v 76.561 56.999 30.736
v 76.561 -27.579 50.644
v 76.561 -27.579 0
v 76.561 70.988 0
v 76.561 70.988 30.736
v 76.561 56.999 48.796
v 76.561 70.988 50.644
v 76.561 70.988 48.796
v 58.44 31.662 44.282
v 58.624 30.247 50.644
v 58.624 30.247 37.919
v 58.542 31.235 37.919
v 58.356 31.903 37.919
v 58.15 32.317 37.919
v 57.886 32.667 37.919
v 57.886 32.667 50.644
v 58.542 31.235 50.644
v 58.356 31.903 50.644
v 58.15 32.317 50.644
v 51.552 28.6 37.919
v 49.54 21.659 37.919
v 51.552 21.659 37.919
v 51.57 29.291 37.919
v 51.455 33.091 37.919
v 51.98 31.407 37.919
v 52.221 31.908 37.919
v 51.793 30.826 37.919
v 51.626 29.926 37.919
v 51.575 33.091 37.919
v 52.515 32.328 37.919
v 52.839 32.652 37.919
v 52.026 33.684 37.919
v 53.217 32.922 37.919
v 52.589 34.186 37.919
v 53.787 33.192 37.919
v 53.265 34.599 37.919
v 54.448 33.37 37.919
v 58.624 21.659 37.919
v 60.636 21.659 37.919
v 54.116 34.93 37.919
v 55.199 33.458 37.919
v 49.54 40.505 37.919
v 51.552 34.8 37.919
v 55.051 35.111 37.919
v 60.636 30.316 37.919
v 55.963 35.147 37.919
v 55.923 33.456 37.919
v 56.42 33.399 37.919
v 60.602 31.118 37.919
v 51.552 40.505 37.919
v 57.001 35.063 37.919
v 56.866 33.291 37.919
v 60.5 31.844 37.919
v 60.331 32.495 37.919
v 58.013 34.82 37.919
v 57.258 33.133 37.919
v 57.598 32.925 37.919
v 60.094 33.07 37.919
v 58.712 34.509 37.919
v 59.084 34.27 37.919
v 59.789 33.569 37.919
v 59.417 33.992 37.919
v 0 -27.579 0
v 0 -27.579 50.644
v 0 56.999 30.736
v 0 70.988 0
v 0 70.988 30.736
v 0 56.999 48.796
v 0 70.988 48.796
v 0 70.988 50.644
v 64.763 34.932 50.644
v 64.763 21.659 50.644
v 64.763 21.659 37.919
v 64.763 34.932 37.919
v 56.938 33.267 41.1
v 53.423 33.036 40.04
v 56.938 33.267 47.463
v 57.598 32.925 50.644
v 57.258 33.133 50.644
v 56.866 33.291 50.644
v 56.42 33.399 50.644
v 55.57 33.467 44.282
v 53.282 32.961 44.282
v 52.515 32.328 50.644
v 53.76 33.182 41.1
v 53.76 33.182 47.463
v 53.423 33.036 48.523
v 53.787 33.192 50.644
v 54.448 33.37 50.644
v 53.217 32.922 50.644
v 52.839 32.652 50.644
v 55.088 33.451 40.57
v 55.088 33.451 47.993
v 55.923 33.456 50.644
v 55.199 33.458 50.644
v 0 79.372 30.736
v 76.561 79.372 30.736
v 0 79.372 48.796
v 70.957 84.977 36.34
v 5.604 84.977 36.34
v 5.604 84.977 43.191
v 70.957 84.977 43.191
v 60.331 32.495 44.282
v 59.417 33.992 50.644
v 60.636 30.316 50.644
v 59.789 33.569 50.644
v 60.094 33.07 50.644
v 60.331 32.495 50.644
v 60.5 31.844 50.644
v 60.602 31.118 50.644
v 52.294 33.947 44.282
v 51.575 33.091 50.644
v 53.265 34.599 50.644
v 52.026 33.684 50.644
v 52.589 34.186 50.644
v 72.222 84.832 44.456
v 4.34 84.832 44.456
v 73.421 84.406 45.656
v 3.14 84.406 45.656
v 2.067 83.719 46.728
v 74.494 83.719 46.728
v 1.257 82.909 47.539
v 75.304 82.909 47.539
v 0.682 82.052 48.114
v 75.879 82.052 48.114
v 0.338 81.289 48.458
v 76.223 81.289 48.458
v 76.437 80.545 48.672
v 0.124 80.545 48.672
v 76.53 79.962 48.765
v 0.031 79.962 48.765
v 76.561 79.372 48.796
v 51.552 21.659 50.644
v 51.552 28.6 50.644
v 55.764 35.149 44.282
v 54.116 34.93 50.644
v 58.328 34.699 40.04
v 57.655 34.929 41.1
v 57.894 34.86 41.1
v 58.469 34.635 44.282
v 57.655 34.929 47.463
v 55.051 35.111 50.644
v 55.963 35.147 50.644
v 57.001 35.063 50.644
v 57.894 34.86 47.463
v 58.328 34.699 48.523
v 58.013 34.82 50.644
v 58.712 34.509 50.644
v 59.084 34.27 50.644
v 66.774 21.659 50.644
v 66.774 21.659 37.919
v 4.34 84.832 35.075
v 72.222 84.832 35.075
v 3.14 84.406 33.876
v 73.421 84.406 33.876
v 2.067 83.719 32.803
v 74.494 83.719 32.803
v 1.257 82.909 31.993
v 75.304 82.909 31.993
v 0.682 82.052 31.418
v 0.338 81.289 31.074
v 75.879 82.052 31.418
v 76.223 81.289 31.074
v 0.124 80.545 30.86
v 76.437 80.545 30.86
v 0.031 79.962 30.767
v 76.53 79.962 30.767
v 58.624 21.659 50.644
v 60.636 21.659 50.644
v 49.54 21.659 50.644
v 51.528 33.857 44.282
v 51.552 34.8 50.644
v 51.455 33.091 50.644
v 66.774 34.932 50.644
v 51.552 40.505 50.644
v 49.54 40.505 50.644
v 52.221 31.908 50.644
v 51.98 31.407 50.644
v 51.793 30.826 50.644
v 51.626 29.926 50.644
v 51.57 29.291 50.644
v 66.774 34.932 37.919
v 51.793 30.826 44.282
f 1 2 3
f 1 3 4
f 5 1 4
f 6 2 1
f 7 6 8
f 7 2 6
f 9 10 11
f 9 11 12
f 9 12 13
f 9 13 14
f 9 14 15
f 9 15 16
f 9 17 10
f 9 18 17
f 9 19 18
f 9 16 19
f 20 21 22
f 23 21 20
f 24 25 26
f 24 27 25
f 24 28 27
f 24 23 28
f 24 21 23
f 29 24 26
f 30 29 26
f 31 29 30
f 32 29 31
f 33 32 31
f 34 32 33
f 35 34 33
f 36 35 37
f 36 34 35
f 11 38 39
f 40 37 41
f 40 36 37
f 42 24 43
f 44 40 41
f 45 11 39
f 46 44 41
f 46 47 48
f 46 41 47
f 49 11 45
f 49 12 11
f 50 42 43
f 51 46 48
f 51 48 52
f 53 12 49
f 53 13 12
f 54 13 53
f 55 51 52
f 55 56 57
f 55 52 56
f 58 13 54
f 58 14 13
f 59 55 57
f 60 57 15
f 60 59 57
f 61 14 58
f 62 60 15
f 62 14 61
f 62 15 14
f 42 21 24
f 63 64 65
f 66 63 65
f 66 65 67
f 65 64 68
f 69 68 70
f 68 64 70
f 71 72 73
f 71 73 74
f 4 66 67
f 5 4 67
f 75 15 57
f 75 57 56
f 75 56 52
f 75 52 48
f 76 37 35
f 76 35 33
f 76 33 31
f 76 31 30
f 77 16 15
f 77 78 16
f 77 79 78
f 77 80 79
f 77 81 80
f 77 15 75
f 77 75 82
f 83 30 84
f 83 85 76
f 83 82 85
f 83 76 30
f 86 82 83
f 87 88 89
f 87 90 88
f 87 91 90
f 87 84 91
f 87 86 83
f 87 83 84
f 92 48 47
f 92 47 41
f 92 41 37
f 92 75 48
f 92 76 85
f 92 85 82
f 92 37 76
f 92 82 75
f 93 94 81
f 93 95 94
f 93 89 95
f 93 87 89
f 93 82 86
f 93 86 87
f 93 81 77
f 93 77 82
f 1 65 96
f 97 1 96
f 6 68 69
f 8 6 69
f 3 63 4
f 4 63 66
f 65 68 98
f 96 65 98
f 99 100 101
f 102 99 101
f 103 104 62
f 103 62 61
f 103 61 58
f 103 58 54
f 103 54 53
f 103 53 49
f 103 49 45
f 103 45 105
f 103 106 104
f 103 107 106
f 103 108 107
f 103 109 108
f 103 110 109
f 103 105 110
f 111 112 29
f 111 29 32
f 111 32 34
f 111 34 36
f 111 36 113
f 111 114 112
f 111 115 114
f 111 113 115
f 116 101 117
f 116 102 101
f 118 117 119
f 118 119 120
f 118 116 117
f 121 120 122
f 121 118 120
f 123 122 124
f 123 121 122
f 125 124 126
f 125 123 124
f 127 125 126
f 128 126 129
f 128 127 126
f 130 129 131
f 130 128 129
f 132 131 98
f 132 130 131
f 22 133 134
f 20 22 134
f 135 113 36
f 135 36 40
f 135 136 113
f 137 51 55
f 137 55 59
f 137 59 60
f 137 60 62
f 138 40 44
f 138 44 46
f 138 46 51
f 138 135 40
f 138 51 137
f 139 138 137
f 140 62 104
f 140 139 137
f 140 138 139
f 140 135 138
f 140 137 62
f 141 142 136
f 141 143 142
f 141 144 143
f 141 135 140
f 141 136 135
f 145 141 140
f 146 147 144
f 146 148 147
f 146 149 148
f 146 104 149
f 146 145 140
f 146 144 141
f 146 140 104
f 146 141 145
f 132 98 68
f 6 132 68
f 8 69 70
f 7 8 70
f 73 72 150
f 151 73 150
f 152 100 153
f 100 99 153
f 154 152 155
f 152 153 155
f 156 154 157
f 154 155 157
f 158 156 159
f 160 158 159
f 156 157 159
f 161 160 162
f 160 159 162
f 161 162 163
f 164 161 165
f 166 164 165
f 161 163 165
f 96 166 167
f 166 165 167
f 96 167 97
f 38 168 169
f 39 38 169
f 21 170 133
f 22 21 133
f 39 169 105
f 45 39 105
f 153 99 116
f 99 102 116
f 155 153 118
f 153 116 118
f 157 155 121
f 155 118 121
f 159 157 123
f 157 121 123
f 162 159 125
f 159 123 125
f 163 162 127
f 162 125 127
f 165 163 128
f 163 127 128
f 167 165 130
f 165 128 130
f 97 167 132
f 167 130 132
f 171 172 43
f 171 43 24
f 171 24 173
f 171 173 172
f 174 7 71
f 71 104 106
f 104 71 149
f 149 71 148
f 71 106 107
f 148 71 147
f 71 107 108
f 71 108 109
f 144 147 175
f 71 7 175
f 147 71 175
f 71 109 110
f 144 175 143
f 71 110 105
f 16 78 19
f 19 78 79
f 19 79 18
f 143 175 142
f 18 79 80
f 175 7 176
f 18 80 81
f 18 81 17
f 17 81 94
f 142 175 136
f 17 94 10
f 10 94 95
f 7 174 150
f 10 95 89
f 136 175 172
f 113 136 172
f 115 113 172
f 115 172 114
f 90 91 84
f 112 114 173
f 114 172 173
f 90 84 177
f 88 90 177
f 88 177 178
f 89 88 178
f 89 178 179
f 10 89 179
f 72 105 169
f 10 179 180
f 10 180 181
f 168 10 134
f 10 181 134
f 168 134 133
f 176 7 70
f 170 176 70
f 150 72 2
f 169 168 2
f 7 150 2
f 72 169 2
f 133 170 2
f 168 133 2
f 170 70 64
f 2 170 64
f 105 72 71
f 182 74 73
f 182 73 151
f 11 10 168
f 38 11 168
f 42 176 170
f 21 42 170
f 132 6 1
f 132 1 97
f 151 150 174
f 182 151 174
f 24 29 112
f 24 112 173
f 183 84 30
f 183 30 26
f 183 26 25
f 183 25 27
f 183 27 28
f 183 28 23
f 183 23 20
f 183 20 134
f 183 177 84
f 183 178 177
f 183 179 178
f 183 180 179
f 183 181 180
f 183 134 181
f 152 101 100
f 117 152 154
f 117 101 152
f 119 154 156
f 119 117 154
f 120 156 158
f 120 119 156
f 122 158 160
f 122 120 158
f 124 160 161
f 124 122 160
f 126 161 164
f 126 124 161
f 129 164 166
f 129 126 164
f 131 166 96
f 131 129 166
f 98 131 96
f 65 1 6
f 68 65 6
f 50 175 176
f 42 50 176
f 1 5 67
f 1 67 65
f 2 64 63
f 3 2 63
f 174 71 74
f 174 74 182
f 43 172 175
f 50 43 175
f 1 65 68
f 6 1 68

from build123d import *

# Parameters (mm, degrees)
F2_DEPTH = 76.5611305833
F0_W     = 13.9886513352
F0_H     = 18.059886992
F3_R     = 5.6044980923
F4_W     = 2.0113031108
F4_H     = 13.2730503942
F5_DEPTH = 12.7252740785


with BuildPart() as f2:
    # F1 (on face) → F2 (new body)
    with BuildSketch(Plane.YZ):
        Polygon((-27.5792516768, 50.6441742182), (-27.5792516768, 0), (70.9878802299, 0), (70.9878802299, 30.7358391583), (56.9992288947, 30.7358391583), (56.9992288947, 48.7957261503), (70.9878802299, 48.7957261503), (70.9878802299, 50.6441742182), align=None)
    extrude(amount=F2_DEPTH)

    # F4 (on face) → F5 (cut)
    with BuildSketch(Plane.XY.offset(50.6441742182)):
        with BuildLine():
            Line((58.6242635295, 30.2465461298), (58.6242635295, 21.6587856412))
            Line((58.6242635295, 21.6587856412), (60.6355666403, 21.6587856412))
            Line((60.6355666403, 21.6587856412), (60.6355666403, 30.3163023071))
            add(Edge.make_bspline(
                [(59.4167712099, 33.992065314), (60.6355666403, 32.8352753746), (60.6355666403, 30.3163023071)],
                knots=[0, 0, 0, 1, 1, 1], degree=2))
            add(Edge.make_bspline(
                [(55.764260262, 35.1488552535), (58.1979757796, 35.1488552535), (59.4167712099, 33.992065314)],
                knots=[0, 0, 0, 1, 1, 1], degree=2))
            add(Edge.make_bspline(
                [(53.2646639104, 34.5985565218), (54.3613860306, 35.1488552535), (55.764260262, 35.1488552535)],
                knots=[0, 0, 0, 1, 1, 1], degree=2))
            add(Edge.make_bspline(
                [(51.5750142836, 33.0910480245), (52.1679417903, 34.0482577901), (53.2646639104, 34.5985565218)],
                knots=[0, 0, 0, 1, 1, 1], degree=2))
            Line((51.5750142836, 33.0910480245), (51.454878645, 33.0910480245))
            add(Edge.make_bspline(
                [(51.5517622245, 34.8000743672), (51.5517622245, 33.7692330811), (51.454878645, 33.0910480245)],
                knots=[0, 0, 0, 1, 1, 1], degree=2))
            Line((51.5517622245, 34.8000743672), (51.5517622245, 40.5045795293))
            Line((51.5517622245, 40.5045795293), (49.5404591137, 40.5045795293))
            Line((49.5404591137, 40.5045795293), (49.5404591137, 21.6587856412))
            Line((49.5404591137, 21.6587856412), (51.5517622245, 21.6587856412))
            Line((51.5517622245, 21.6587856412), (51.5517622245, 28.599525278))
            add(Edge.make_bspline(
                [(52.514785005, 32.3276054179), (51.5517622245, 31.1882545227), (51.5517622245, 28.599525278)],
                knots=[0, 0, 0, 1, 1, 1], degree=2))
            add(Edge.make_bspline(
                [(55.570493103, 33.466956313), (53.4778077854, 33.466956313), (52.514785005, 32.3276054179)],
                knots=[0, 0, 0, 1, 1, 1], degree=2))
            add(Edge.make_bspline(
                [(57.8860106535, 32.6666979462), (57.1477577776, 33.466956313), (55.570493103, 33.466956313)],
                knots=[0, 0, 0, 1, 1, 1], degree=2))
            add(Edge.make_bspline(
                [(58.6242635295, 30.2465461298), (58.6242635295, 31.8664395794), (57.8860106535, 32.6666979462)],
                knots=[0, 0, 0, 1, 1, 1], degree=2))
        make_face()
        with Locations((65.7684586832, 28.2953108383)):
            Rectangle(F4_W, F4_H)
    extrude(amount=-F5_DEPTH, mode=Mode.SUBTRACT)


with BuildPart() as f2b:
    # F0 (on Right) → F2, piece 2 (new body)
    with BuildSketch(Plane.YZ):
        with Locations((77.9822058976, 39.7657826543)):
            Rectangle(F0_W, F0_H)
        with Locations((63.9935545623, 39.7657826543)):
            Rectangle(F0_W, F0_H)
    extrude(amount=F2_DEPTH)

    # F3
    f3_edges = [f2b.edges().sort_by_distance(p)[0] for p in [
        (38.280565, 84.976532, 30.735839),
        (38.280565, 84.976532, 48.795726),
        (76.561131, 84.976532, 39.765783),
        (0, 84.976532, 39.765783),
    ]]
    fillet(f3_edges, radius=F3_R)


solid = Compound([f2.part, f2b.part])
